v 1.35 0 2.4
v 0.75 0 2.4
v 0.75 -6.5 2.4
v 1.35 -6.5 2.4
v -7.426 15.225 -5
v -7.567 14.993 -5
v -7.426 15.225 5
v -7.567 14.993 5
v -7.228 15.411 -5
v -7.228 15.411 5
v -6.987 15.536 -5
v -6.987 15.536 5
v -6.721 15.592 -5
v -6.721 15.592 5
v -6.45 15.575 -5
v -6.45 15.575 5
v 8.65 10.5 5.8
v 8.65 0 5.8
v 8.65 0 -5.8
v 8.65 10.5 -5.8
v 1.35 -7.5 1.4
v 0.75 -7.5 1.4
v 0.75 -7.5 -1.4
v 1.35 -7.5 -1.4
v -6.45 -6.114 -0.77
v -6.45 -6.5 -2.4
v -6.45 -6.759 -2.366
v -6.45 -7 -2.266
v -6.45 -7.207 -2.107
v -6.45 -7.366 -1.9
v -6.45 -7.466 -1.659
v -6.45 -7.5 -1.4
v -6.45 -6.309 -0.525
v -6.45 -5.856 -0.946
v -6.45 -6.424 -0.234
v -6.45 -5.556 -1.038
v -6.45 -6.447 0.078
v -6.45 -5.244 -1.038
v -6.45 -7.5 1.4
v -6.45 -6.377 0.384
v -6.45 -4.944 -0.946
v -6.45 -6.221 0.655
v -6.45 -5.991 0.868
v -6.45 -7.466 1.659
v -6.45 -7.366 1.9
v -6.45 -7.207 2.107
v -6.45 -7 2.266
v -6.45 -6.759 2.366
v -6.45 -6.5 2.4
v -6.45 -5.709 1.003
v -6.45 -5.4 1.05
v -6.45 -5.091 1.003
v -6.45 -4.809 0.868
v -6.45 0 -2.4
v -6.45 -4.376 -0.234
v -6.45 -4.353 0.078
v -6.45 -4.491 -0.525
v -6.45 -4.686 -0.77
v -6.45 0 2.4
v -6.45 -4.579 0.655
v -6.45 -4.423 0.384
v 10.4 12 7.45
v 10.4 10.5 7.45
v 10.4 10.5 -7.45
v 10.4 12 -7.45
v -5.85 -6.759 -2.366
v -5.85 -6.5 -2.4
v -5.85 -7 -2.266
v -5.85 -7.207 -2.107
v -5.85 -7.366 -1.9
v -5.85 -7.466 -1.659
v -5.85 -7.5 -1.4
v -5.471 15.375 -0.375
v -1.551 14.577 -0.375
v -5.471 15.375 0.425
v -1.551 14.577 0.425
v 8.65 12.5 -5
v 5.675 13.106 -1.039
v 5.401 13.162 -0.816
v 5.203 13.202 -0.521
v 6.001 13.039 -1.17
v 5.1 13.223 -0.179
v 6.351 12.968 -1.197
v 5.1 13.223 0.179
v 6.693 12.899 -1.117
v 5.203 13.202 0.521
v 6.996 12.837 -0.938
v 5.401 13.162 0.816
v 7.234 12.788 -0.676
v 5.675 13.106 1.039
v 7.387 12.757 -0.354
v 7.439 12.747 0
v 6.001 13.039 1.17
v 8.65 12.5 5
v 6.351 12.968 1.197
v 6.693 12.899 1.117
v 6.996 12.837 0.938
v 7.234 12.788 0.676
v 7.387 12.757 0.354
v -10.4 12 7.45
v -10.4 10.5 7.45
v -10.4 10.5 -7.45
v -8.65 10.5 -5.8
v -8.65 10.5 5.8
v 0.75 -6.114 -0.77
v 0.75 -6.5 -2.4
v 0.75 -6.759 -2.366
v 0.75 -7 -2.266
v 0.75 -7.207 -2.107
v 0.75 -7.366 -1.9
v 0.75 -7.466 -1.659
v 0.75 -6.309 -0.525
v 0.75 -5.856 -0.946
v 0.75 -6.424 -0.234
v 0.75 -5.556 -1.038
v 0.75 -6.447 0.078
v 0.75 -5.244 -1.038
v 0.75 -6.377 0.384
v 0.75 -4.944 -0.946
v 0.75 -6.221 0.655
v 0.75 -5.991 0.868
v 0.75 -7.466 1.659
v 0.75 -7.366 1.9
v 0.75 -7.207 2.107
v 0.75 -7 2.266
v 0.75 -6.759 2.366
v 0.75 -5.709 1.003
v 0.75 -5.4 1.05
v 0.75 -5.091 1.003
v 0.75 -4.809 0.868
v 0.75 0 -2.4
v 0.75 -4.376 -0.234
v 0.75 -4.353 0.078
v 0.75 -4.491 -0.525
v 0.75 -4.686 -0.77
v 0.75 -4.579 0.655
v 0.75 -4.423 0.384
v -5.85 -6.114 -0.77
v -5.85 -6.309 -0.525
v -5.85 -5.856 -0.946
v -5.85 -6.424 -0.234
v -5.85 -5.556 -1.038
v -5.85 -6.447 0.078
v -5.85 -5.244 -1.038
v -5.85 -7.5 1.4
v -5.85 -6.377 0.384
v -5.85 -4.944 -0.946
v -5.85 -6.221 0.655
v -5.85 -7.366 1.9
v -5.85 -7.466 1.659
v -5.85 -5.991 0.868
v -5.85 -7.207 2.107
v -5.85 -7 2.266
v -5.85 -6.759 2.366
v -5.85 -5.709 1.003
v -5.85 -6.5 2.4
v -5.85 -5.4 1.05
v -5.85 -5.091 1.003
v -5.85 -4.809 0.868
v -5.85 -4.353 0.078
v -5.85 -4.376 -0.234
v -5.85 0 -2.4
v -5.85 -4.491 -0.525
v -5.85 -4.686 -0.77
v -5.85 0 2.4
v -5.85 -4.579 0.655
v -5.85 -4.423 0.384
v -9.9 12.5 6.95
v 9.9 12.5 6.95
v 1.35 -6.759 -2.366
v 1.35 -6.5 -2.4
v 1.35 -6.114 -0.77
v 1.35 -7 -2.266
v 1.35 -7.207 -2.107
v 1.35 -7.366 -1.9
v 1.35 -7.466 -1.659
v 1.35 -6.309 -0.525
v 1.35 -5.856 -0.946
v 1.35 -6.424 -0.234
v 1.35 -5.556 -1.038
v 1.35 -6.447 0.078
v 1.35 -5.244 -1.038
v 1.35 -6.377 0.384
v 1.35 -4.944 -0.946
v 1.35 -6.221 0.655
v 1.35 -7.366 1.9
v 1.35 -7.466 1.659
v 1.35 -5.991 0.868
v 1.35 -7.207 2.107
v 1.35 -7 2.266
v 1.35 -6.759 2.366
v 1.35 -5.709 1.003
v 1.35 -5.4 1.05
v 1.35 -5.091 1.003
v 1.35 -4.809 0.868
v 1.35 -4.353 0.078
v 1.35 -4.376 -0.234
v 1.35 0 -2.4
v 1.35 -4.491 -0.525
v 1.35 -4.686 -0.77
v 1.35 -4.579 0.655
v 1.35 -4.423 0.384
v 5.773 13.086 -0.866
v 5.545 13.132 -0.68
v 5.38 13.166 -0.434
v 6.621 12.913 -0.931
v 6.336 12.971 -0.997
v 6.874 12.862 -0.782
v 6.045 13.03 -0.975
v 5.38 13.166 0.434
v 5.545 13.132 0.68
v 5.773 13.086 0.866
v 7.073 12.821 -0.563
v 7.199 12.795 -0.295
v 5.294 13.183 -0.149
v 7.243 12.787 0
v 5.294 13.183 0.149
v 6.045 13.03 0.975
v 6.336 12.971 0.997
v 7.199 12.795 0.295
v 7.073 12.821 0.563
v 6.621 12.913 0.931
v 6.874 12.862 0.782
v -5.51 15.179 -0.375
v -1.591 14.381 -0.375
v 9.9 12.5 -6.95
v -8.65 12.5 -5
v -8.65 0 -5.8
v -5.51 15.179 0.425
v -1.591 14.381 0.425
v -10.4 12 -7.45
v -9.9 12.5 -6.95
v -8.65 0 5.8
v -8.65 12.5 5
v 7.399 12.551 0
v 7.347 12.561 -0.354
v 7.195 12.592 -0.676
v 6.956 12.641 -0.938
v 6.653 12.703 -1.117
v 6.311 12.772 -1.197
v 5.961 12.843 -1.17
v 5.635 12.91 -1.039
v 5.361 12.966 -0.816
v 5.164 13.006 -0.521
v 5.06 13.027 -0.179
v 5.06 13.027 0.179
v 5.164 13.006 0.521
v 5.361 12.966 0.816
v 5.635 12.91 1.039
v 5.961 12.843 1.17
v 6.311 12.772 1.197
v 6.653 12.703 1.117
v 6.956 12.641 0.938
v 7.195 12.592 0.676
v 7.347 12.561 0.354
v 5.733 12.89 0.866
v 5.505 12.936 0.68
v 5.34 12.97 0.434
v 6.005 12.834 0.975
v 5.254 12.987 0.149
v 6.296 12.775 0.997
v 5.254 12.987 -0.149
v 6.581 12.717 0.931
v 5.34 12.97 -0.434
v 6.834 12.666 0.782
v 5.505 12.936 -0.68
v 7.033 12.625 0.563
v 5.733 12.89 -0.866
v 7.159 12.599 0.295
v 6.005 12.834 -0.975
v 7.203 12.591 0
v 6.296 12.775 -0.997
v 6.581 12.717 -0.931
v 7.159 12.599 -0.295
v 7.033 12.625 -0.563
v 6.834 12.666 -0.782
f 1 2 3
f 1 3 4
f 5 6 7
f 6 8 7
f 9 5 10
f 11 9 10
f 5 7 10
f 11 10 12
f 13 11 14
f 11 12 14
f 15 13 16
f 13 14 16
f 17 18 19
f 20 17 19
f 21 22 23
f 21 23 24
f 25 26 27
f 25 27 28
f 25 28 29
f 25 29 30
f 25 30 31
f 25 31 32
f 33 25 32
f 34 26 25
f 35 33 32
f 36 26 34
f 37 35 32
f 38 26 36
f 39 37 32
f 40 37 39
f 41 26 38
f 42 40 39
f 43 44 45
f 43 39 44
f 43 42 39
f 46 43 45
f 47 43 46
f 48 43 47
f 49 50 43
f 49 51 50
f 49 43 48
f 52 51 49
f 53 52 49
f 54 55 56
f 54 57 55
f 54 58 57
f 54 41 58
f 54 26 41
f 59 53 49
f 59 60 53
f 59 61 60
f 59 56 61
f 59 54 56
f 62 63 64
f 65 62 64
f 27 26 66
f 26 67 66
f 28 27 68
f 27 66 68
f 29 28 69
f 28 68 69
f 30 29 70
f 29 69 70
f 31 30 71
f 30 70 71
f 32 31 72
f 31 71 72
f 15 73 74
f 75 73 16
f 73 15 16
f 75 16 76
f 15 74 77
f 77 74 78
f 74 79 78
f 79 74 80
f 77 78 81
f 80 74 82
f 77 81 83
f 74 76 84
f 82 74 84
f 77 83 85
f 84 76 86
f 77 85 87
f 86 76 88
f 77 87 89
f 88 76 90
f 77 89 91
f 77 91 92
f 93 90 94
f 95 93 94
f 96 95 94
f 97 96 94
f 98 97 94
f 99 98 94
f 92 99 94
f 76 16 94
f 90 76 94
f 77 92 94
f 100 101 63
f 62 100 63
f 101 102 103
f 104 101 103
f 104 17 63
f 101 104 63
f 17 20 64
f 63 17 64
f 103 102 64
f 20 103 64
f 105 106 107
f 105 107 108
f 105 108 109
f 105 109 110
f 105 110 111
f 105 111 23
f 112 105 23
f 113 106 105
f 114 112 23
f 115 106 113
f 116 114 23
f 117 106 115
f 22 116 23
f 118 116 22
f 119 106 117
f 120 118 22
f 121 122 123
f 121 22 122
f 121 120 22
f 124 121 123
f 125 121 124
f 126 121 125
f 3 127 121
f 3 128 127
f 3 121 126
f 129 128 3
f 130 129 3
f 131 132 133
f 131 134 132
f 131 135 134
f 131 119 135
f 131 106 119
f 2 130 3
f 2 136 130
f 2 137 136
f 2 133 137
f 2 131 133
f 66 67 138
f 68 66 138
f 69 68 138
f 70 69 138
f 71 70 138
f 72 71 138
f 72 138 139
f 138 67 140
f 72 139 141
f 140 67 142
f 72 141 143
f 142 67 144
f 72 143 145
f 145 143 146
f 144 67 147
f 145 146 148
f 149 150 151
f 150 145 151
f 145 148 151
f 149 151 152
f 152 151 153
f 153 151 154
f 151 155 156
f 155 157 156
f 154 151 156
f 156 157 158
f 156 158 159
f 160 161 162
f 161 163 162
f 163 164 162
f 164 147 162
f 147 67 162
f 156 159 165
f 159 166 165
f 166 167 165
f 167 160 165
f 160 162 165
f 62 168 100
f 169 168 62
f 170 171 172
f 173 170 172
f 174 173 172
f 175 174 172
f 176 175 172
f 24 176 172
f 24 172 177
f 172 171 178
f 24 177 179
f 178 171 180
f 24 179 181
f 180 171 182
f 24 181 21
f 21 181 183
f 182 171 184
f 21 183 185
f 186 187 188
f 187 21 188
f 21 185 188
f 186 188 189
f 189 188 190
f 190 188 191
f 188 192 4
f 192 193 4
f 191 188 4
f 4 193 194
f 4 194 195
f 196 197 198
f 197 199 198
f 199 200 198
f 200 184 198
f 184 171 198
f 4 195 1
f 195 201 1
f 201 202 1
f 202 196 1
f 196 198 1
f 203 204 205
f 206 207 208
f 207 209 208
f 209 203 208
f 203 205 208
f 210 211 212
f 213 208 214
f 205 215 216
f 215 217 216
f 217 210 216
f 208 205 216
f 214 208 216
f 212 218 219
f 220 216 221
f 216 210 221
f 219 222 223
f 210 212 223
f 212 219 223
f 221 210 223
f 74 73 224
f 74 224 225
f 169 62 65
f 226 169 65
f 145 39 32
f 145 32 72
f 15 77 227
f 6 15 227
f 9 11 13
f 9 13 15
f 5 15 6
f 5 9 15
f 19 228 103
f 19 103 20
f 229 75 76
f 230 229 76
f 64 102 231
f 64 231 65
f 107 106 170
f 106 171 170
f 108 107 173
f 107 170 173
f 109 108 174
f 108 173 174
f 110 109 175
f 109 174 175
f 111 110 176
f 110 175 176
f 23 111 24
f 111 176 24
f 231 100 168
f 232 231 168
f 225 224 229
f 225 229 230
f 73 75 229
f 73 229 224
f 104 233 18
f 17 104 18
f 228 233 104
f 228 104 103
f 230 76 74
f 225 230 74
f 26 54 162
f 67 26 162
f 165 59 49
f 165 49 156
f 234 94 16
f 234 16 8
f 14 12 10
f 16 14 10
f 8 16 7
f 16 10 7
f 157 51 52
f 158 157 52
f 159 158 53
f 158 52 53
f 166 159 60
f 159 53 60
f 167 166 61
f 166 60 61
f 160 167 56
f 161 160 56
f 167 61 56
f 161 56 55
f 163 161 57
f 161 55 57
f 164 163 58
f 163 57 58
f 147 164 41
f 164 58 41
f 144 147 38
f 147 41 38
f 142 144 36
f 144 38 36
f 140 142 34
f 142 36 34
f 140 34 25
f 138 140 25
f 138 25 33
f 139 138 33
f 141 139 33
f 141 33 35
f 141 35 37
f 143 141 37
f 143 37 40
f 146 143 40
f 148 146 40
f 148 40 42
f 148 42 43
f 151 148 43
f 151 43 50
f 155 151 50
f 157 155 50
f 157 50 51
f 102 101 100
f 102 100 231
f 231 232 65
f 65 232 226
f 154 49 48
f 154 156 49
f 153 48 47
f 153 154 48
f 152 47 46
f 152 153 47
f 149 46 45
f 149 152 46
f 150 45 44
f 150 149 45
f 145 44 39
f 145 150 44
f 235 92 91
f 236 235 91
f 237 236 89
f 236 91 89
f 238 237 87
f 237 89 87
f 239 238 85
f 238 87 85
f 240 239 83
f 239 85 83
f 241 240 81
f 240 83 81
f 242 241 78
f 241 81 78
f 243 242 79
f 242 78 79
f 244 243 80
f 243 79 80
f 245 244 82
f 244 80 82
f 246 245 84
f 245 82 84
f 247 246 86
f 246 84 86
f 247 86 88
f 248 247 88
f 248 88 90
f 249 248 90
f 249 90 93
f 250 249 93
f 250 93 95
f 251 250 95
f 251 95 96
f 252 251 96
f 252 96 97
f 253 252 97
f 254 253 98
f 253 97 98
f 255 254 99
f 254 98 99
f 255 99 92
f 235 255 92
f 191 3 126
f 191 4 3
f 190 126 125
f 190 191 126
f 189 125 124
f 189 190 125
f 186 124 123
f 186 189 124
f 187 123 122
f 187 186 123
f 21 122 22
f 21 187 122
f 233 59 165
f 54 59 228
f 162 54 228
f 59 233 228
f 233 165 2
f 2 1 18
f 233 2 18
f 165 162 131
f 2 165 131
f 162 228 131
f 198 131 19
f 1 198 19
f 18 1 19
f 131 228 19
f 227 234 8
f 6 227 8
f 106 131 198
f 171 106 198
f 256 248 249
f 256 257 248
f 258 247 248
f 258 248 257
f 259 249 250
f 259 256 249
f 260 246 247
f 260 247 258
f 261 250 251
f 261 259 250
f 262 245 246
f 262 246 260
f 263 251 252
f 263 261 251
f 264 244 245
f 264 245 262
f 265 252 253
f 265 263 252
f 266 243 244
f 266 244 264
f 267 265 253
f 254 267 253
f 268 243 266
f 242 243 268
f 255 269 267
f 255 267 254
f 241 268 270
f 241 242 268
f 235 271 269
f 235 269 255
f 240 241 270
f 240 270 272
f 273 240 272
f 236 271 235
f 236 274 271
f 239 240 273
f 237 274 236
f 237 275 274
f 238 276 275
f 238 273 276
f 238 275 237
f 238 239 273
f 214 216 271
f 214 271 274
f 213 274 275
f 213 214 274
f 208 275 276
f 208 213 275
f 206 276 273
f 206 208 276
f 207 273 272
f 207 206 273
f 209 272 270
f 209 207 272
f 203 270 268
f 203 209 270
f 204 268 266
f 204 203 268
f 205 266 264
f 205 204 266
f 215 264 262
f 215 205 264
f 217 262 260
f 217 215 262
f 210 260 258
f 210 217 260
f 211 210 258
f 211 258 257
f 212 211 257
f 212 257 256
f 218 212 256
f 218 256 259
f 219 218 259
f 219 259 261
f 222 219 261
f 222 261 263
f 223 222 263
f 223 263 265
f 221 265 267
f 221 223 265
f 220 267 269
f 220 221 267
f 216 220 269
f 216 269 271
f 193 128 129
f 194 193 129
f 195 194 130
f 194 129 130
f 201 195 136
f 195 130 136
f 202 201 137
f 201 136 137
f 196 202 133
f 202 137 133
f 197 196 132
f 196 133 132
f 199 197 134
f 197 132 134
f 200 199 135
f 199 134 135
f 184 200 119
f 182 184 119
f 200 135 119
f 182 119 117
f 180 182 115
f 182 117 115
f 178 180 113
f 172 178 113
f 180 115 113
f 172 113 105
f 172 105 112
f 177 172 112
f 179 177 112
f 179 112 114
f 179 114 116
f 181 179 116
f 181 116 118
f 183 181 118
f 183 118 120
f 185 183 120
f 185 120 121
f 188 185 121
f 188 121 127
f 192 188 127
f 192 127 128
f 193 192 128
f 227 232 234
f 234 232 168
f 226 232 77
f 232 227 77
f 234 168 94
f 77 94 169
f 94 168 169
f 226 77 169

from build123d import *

# Parameters (mm, degrees)
SKETCH_1_W          = 17.3
SKETCH_1_H          = 11.6
EXTRUDE_1_DEPTH     = 10.5
SKETCH_2_W          = 20.8
SKETCH_2_H          = 14.9
EXTRUDE_2_DEPTH     = 2
CHAMFER_1_SIZE      = 0.5
SKETCH_3_W          = 0.6
SKETCH_3_H          = 4.8
EXTRUDE_3_DEPTH     = 7.5
SKETCH_4_R          = 1.05
CUT_EXTRUDE_1_DEPTH = 17.85
FILLET_1_R          = 1
EXTRUDE_4_DEPTH     = 5
SKETCH_7_R          = 1.2
SKETCH_7_R_2        = 1
SKETCH_7_W          = 4
SKETCH_7_H          = 0.8
CUT_EXTRUDE_2_DEPTH = 0.2


with BuildPart() as part:
    # 草图1 → 凸台-拉伸1 (new body)
    with BuildSketch(Plane(origin=(0, 0, 0), x_dir=(1, 0, 0), z_dir=(0, 1, 0))):
        Rectangle(SKETCH_1_W, SKETCH_1_H)
    extrude(amount=EXTRUDE_1_DEPTH)

    # 草图2 → 凸台-拉伸2 (add)
    with BuildSketch(Plane(origin=(0, 10.5, 0), x_dir=(1, 0, 0), z_dir=(0, 1, 0))):
        Rectangle(SKETCH_2_W, SKETCH_2_H)
    extrude(amount=EXTRUDE_2_DEPTH)

    # 倒角1
    chamfer_1_edges = [part.edges().sort_by_distance(p)[0] for p in [
        (10.4, 12.5, 0),
        (0, 12.5, -7.45),
        (-10.4, 12.5, 0),
        (0, 12.5, 7.45),
    ]]
    chamfer(chamfer_1_edges, length=CHAMFER_1_SIZE)

    # 草图3 → 凸台-拉伸3 (add)
    with BuildSketch(Plane.XZ):
        with Locations((-6.15, 0)):
            Rectangle(SKETCH_3_W, SKETCH_3_H)
        with Locations((1.05, 0)):
            Rectangle(SKETCH_3_W, SKETCH_3_H)
    extrude(amount=EXTRUDE_3_DEPTH)

    # 草图4 → 切除-拉伸1 (cut, through all)
    with BuildSketch(Plane.ZY.offset(6.45)):
        with Locations((0, -5.4)):
            Circle(SKETCH_4_R)
    extrude(amount=-CUT_EXTRUDE_1_DEPTH, mode=Mode.SUBTRACT)

    # 圆角1
    fillet_1_edges = [part.edges().sort_by_distance(p)[0] for p in [
        (-6.15, -7.5, -2.4),
        (-6.15, -7.5, 2.4),
        (1.05, -7.5, -2.4),
        (1.05, -7.5, 2.4),
    ]]
    fillet(fillet_1_edges, radius=FILLET_1_R)

    # 草图6 → 凸台-拉伸4 (add, symmetric)
    with BuildSketch(Plane.XY):
        with BuildLine():
            Line((-8.65, 12.5), (-7.567226169, 14.993049988))
            ThreePointArc((-7.567226169, 14.993049988), (-7.111867175, 15.481632233), (-6.450485665, 15.574578036))
            Line((-6.450485665, 15.574578036), (8.65, 12.5))
            Line((8.65, 12.5), (9.9, 12.5))
            Line((9.9, 12.5), (10.4, 12))
            Line((10.4, 12), (-10.4, 12))
            Line((-10.4, 12), (-9.9, 12.5))
            Line((-9.9, 12.5), (-8.65, 12.5))
        make_face()
    extrude(amount=EXTRUDE_4_DEPTH, both=True)

    # 草图7 → 切除-拉伸2 (cut)
    with BuildSketch(Plane(origin=(2.788110156, 13.693527027, 0), x_dir=(0.979894908, -0.199514335, 0), z_dir=(0.199514335, 0.979894908, 0))):
        with Locations((3.54609821, 0)):
            Circle(SKETCH_7_R)
        with Locations((3.54609821, 0)):
            Circle(SKETCH_7_R_2, mode=Mode.SUBTRACT)
        with Locations((-6.42814964, -0.024521247)):
            Rectangle(SKETCH_7_W, SKETCH_7_H)
    extrude(amount=-CUT_EXTRUDE_2_DEPTH, mode=Mode.SUBTRACT)


solid = part.part
